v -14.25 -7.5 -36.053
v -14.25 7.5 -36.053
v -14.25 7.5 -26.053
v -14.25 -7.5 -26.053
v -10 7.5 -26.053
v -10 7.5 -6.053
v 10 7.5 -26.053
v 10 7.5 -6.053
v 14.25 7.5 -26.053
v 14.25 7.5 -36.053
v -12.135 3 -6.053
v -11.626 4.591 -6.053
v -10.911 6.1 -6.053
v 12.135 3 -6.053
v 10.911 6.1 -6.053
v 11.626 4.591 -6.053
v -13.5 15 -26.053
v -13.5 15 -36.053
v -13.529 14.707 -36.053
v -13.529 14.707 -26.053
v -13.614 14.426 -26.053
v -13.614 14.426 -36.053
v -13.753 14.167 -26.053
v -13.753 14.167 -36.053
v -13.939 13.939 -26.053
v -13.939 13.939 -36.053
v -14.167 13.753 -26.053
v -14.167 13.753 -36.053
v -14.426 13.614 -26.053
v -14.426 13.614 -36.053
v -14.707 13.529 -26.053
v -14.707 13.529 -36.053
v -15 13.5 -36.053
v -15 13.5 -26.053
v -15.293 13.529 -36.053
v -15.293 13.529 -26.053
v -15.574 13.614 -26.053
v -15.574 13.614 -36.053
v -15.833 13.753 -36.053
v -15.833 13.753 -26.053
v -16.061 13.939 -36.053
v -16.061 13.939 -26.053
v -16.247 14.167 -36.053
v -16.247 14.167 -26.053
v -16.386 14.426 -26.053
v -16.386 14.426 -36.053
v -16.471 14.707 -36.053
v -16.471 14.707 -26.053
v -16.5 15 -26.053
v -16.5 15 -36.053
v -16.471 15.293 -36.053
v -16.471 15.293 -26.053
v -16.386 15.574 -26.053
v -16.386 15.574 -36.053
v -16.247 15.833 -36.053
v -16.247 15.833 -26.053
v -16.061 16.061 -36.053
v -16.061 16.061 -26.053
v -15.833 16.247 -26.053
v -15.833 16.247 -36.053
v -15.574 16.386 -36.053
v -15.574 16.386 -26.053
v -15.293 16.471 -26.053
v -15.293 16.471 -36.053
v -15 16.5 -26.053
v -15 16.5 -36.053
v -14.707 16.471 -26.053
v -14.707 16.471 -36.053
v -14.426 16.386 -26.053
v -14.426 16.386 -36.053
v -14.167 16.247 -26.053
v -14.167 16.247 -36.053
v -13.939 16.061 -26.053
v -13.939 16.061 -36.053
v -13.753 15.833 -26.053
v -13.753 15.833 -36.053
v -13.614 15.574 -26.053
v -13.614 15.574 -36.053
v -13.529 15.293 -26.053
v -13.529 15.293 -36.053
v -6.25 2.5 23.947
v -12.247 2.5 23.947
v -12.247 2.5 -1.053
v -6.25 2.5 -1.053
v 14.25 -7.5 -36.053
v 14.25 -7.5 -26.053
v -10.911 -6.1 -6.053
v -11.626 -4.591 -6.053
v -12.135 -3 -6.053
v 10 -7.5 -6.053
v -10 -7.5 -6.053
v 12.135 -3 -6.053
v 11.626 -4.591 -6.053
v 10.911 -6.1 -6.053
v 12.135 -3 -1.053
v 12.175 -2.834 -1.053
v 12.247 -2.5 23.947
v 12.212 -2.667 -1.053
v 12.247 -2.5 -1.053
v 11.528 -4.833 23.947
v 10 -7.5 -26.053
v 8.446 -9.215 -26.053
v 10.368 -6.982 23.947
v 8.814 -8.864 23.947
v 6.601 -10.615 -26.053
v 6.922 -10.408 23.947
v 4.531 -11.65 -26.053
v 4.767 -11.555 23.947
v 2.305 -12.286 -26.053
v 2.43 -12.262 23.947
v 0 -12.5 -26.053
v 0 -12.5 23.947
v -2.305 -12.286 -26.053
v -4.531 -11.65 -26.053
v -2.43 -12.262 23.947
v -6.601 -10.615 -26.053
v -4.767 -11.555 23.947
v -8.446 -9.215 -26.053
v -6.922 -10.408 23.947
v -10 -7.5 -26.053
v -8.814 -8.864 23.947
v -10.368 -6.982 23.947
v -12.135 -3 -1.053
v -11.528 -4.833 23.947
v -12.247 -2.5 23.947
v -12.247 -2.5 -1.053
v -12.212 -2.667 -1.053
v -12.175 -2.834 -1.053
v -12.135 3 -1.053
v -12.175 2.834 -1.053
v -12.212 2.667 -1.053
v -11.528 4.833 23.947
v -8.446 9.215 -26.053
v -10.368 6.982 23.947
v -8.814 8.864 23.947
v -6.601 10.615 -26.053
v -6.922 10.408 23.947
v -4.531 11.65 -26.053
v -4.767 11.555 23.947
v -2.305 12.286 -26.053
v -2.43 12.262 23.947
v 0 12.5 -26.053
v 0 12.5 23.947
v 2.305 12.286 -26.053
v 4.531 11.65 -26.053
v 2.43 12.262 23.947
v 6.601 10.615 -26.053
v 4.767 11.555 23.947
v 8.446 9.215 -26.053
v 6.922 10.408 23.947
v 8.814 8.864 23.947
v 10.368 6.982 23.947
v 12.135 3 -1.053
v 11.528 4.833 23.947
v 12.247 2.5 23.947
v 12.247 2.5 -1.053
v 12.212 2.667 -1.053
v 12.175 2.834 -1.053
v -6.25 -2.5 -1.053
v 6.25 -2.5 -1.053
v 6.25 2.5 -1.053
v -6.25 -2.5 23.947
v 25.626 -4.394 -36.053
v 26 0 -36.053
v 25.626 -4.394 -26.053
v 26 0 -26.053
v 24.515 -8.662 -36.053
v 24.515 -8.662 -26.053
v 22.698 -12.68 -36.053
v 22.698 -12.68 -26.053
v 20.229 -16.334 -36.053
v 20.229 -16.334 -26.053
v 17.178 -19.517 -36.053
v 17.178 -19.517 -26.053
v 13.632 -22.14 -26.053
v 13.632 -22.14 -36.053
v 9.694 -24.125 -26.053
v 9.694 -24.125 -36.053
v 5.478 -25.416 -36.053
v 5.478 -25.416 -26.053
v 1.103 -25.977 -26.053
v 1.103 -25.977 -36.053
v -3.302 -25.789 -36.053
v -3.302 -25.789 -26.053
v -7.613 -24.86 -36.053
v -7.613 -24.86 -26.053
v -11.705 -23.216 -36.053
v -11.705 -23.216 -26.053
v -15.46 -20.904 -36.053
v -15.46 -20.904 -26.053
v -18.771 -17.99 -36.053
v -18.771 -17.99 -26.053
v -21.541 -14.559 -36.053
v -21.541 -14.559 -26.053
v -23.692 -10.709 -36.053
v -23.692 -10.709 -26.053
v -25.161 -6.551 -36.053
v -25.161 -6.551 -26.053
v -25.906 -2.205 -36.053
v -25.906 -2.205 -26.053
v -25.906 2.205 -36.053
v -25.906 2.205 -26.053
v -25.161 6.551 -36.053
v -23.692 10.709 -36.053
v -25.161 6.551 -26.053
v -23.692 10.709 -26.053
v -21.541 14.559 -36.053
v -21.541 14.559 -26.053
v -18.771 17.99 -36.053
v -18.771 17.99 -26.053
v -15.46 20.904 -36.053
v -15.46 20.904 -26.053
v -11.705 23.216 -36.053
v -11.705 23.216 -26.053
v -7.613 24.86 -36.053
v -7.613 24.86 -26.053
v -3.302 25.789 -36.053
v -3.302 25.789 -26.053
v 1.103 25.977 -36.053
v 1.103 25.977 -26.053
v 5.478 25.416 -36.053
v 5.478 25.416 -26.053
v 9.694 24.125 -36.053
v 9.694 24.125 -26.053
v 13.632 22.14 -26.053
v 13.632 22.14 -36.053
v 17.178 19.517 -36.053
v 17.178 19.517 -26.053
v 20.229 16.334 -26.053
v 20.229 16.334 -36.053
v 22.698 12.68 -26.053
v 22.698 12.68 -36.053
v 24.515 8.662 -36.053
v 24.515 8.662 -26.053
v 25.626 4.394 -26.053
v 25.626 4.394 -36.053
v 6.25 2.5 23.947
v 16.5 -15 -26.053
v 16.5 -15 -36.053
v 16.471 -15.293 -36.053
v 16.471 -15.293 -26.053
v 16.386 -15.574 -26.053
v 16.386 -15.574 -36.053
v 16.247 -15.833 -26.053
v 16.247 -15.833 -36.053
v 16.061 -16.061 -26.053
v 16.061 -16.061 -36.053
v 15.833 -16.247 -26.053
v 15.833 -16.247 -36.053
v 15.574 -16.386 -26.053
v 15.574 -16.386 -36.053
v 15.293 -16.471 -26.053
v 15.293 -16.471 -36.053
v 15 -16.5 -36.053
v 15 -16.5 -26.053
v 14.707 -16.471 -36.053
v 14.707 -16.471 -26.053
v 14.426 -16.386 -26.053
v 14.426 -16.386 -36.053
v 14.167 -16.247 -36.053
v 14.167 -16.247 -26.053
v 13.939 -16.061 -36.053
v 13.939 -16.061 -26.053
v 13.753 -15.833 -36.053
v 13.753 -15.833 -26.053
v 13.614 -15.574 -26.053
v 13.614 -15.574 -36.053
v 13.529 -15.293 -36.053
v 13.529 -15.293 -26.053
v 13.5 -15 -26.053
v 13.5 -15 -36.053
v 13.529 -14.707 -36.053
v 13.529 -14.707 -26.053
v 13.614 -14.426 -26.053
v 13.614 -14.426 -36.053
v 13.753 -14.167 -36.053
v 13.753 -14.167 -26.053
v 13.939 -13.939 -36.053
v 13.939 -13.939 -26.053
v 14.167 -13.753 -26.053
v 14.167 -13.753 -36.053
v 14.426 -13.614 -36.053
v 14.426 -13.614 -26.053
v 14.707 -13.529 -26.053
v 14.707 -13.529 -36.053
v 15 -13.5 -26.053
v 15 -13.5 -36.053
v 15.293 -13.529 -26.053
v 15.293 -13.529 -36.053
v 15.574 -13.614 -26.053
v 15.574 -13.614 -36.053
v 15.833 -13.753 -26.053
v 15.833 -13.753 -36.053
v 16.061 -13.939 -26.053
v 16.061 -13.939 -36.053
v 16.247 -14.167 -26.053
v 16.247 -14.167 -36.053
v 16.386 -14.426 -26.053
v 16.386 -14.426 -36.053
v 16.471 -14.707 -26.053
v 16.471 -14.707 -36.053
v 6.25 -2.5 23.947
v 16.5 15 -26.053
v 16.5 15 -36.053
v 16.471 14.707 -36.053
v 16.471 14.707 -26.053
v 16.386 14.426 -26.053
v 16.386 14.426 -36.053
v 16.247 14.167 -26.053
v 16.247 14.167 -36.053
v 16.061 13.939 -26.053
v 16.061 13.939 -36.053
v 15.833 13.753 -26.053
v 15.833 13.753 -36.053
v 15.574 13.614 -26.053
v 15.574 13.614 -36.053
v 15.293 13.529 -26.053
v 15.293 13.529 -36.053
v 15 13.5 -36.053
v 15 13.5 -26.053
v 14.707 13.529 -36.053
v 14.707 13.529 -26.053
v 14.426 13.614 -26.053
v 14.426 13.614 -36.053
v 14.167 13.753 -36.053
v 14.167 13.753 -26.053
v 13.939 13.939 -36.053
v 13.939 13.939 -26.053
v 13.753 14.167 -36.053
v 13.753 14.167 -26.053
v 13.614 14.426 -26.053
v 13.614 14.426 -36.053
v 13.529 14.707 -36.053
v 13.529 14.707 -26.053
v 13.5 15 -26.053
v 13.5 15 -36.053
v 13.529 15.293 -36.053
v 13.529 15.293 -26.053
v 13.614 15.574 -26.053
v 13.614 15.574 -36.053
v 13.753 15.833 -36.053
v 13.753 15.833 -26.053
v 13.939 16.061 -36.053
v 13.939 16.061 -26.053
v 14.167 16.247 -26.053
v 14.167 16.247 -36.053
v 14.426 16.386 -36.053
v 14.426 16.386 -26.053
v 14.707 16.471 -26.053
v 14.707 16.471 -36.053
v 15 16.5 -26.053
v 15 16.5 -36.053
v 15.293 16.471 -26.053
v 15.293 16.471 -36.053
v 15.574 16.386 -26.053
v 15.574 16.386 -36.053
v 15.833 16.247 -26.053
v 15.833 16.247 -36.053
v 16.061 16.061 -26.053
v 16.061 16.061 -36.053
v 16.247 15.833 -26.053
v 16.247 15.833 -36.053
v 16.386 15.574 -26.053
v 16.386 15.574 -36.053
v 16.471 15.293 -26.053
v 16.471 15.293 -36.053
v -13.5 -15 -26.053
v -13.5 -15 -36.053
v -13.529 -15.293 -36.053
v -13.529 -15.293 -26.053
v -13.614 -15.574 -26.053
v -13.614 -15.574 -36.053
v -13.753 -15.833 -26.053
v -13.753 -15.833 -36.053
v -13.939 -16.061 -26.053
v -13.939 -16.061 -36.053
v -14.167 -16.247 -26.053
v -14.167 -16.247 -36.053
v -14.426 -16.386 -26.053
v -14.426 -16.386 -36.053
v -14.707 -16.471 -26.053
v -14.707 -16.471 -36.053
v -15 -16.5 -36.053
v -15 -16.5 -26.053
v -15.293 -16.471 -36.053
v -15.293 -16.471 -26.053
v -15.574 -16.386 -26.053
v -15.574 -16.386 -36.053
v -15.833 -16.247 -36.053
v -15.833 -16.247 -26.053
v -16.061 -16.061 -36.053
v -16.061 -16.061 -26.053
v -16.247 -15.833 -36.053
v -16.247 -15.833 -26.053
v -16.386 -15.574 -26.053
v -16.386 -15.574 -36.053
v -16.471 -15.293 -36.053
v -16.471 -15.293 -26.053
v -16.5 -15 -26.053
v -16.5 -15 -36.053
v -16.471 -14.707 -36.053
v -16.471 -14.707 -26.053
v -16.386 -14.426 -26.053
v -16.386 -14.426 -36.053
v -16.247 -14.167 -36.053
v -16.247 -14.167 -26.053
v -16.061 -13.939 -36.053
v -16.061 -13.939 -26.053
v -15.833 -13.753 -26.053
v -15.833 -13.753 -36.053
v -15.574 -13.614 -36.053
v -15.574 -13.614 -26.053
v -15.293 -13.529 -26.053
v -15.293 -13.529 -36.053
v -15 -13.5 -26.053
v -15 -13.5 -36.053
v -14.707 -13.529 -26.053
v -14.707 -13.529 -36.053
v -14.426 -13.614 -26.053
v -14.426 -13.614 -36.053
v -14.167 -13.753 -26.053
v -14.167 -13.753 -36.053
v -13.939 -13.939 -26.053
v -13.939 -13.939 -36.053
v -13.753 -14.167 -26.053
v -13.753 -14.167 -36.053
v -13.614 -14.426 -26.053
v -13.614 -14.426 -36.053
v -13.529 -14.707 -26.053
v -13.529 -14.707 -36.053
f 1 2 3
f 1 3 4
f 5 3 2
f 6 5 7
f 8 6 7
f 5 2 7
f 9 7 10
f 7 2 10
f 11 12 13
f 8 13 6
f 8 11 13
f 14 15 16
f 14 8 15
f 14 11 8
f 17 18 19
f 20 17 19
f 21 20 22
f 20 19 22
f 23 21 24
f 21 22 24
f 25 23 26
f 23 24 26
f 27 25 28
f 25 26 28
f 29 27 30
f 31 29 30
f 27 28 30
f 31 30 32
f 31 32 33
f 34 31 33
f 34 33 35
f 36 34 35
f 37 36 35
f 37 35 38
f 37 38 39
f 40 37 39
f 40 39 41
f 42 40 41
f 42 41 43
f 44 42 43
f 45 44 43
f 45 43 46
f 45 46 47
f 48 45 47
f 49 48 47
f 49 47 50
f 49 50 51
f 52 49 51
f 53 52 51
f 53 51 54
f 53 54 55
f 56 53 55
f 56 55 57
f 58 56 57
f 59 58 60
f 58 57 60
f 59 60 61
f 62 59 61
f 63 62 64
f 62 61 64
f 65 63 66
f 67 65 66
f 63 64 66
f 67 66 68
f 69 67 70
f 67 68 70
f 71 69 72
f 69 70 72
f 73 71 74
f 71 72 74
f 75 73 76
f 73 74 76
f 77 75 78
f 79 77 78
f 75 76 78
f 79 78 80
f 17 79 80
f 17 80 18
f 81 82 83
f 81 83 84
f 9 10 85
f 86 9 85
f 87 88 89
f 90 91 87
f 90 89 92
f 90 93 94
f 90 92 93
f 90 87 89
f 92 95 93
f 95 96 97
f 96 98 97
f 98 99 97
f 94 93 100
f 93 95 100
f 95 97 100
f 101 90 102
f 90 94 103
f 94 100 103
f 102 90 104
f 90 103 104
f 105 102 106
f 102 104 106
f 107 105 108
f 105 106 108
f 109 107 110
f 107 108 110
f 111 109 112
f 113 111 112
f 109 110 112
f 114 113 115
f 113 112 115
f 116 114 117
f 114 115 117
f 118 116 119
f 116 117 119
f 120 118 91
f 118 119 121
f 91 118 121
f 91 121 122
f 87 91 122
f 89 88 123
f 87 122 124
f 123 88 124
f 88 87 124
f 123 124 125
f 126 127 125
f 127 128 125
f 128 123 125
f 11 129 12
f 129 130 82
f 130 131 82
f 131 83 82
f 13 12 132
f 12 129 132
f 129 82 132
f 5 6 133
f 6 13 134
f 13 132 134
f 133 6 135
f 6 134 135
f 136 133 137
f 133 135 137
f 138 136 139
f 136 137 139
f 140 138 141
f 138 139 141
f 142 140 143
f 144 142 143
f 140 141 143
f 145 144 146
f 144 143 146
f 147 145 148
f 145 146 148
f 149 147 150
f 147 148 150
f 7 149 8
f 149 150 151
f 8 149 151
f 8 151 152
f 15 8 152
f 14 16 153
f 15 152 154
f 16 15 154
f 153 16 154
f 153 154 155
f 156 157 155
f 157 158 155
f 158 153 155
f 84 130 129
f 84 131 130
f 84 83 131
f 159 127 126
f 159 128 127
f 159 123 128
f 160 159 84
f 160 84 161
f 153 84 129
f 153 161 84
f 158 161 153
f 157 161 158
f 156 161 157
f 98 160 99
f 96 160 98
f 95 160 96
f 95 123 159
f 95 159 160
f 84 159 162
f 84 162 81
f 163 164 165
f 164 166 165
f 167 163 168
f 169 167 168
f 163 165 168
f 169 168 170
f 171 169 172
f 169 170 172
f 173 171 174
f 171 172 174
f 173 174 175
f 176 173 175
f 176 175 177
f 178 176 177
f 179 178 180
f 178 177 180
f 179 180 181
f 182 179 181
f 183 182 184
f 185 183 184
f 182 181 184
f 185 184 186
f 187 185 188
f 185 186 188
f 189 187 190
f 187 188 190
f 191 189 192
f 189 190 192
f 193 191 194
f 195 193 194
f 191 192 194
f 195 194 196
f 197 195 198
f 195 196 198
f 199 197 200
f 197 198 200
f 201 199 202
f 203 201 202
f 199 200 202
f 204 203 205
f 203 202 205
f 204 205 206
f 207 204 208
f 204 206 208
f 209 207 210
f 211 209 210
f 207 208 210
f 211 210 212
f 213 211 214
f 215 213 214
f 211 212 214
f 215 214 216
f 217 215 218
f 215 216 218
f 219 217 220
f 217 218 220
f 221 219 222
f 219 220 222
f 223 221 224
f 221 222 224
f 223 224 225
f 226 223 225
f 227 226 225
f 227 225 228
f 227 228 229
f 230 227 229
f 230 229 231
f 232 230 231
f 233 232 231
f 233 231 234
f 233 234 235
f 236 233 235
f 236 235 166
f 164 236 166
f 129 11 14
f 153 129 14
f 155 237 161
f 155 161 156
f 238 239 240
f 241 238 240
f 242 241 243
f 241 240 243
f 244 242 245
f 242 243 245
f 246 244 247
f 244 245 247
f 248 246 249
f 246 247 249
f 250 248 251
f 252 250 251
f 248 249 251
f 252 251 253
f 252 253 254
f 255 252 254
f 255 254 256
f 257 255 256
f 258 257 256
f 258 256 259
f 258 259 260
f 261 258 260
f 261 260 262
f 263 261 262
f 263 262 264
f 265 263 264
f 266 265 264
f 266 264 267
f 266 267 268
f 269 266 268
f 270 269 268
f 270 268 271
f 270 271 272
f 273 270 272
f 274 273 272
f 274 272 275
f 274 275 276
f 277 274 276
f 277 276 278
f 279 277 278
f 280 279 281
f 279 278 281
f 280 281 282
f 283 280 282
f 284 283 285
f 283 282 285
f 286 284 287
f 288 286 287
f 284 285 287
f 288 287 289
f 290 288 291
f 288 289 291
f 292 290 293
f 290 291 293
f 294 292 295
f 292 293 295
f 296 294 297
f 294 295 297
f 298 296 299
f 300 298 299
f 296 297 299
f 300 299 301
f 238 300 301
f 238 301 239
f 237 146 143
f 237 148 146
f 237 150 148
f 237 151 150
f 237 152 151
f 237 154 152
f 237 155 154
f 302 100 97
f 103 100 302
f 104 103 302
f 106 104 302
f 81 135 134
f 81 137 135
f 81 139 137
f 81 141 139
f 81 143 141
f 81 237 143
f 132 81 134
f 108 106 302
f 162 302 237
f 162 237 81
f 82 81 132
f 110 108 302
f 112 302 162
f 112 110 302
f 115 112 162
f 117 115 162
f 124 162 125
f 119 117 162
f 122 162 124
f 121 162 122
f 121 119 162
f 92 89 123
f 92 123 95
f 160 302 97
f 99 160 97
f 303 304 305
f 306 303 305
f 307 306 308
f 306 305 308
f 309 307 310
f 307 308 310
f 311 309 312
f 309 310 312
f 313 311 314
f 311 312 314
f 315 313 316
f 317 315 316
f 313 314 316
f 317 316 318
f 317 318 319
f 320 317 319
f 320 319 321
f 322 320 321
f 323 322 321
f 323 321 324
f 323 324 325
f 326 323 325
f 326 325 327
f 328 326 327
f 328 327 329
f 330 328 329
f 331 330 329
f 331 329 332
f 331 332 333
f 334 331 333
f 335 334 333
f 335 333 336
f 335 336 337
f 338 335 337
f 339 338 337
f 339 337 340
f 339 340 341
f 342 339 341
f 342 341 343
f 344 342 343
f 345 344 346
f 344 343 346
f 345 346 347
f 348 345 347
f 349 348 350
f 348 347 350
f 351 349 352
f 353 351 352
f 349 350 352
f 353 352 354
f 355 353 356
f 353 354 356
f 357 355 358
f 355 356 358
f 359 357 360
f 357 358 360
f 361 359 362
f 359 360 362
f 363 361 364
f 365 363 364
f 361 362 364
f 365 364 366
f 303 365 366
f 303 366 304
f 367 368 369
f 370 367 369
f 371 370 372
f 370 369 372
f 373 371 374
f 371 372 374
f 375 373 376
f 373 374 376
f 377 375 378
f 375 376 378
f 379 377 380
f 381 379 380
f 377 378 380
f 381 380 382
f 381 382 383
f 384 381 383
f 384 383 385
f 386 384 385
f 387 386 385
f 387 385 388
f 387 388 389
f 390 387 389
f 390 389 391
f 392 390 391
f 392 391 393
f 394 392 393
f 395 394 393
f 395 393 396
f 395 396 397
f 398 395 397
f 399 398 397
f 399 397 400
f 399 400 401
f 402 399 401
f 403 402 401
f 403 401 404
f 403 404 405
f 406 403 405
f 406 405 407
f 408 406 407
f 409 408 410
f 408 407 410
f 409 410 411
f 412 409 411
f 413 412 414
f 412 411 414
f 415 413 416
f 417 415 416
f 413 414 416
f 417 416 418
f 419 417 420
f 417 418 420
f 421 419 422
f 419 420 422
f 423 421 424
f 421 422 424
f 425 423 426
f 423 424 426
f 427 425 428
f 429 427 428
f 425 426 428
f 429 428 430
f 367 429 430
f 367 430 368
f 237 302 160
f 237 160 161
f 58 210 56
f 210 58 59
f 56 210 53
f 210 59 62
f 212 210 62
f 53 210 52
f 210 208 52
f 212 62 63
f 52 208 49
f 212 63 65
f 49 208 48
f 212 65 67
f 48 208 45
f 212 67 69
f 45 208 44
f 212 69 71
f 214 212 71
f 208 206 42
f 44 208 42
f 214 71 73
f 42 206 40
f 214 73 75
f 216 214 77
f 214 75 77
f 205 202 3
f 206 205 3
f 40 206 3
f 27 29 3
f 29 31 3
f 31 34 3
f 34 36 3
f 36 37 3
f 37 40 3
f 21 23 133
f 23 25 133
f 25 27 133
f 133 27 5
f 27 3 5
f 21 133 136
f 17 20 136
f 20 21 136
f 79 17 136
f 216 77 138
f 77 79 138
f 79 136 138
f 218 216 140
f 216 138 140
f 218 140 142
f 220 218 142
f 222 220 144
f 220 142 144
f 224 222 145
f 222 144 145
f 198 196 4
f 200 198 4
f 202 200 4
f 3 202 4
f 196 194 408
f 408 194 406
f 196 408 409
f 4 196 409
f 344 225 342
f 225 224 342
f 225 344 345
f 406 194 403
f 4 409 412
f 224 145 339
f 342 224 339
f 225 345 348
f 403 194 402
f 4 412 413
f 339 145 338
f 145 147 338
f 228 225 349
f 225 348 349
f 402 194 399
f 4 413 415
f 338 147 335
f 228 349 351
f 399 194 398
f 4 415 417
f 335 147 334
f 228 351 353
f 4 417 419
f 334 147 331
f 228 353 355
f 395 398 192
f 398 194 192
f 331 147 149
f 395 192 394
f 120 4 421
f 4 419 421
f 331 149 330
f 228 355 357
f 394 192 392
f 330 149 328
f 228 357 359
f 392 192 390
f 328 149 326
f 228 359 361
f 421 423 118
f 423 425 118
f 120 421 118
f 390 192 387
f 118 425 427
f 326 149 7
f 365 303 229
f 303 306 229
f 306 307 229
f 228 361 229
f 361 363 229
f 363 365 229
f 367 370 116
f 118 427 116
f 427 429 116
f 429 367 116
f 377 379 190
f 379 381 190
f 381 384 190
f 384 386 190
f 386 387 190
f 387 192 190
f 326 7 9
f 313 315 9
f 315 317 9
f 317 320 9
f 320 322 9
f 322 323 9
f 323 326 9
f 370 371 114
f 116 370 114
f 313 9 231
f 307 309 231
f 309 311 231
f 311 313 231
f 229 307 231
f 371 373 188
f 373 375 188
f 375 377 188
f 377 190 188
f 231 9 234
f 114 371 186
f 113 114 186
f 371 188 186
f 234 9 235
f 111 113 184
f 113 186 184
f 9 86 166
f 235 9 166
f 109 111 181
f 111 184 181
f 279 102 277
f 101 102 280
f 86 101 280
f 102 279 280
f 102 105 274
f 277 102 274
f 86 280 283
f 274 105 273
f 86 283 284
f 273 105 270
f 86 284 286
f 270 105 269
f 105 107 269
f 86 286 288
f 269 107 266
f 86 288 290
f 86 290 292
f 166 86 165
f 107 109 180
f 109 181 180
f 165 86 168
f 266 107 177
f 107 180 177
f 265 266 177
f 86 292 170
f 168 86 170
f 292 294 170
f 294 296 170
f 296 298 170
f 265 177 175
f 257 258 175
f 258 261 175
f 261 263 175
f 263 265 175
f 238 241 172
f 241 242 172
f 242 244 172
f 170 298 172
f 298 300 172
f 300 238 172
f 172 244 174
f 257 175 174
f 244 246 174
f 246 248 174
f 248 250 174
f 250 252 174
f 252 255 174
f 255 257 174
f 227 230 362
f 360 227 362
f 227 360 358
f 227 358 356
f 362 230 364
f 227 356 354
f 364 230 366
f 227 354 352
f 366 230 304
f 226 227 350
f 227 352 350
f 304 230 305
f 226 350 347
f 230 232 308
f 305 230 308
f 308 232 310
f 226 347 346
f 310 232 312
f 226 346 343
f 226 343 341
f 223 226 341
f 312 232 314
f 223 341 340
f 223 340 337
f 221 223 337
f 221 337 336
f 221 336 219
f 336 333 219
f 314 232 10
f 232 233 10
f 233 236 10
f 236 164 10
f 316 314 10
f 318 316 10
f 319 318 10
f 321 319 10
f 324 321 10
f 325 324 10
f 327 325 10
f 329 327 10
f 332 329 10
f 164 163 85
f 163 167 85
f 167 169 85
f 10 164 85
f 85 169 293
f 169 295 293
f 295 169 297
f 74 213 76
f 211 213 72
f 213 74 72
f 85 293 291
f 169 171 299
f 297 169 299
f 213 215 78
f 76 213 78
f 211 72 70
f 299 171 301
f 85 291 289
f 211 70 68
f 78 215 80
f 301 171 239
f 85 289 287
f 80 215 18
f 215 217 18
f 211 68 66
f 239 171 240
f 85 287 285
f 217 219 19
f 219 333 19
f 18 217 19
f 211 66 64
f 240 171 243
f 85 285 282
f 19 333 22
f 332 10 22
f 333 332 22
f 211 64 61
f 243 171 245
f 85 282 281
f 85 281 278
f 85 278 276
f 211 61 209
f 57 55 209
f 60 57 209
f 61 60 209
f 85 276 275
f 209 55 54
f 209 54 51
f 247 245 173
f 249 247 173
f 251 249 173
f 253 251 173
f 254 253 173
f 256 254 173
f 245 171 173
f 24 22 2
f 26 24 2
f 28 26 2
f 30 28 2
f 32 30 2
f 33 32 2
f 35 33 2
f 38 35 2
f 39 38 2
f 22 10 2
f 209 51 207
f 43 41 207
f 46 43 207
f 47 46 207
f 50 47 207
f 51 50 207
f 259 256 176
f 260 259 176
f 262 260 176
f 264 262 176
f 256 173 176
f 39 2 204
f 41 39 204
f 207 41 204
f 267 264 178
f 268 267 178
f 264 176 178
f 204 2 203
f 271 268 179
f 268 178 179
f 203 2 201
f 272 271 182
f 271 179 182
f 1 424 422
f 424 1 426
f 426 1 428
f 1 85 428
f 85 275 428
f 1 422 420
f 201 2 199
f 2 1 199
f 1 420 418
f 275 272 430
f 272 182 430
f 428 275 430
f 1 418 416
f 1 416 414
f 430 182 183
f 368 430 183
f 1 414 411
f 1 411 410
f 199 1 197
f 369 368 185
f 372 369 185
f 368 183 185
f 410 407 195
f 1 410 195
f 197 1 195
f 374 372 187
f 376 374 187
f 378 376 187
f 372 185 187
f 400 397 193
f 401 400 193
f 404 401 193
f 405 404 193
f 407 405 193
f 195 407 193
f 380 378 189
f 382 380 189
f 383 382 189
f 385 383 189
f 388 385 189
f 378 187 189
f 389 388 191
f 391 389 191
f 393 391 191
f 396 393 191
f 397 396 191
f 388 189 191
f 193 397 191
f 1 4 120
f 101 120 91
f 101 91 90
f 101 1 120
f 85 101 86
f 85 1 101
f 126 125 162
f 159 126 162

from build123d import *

# Parameters (mm, degrees)
F0_W     = 12.5
F0_H     = 50
F2_W     = 8
F2_H     = 5
F3_DEPTH = 37.5
F4_W     = 28.5
F4_H     = 6
F5_DEPTH = 35
F6_W     = 28.5
F6_H     = 4.5
F7_DEPTH = 30
F6_H_2   = 15
F6_R     = 1.5
F8_DEPTH = 11


with BuildPart() as f1:
    # F0 (on Front) → F1 (revolve)
    with BuildSketch(Plane.XZ):
        with Locations((6.25, -1.05346)):
            Rectangle(F0_W, F0_H)
        Polygon((12.5, -26.05346), (0, -26.05346), (0, -36.05346), (26, -36.05346), (26, -26.05346), align=None)
    revolve(axis=Axis((0, 0, -1.05346), (0, 0, -1)))

    # F2 (on Top) → F3 (cut, symmetric)
    with BuildSketch(Plane.XY):
        with Locations((-10.25, 0)):
            Rectangle(F2_W, F2_H)
        with Locations((10.25, 0)):
            Rectangle(F2_W, F2_H)
    extrude(amount=F3_DEPTH, both=True, mode=Mode.SUBTRACT)

    # F4 (on face) → F5 (cut)
    with BuildSketch(Plane(origin=(0, 0, -36.05346), x_dir=(1, 0, 0), z_dir=(0, 0, -1))):
        Rectangle(F4_W, F4_H)
    extrude(amount=-F5_DEPTH, mode=Mode.SUBTRACT)

    # F6 (on face) → F7 (cut)
    with BuildSketch(Plane(origin=(0, 0, -36.05346), x_dir=(1, 0, 0), z_dir=(0, 0, -1))):
        with Locations((0, 5.25)):
            Rectangle(F6_W, F6_H)
        with Locations((0, -5.25)):
            Rectangle(F6_W, F6_H)
    extrude(amount=-F7_DEPTH, mode=Mode.SUBTRACT)

    # F6 (on face) → F8 (cut)
    with BuildSketch(Plane(origin=(0, 0, -36.05346), x_dir=(1, 0, 0), z_dir=(0, 0, -1))):
        Rectangle(F6_W, F6_H_2)
        with Locations((15, -15)):
            Circle(F6_R)
        with Locations((-15, -15)):
            Circle(F6_R)
        with Locations((15, 15)):
            Circle(F6_R)
        with Locations((-15, 15)):
            Circle(F6_R)
    extrude(amount=-F8_DEPTH, mode=Mode.SUBTRACT)


solid = f1.part
